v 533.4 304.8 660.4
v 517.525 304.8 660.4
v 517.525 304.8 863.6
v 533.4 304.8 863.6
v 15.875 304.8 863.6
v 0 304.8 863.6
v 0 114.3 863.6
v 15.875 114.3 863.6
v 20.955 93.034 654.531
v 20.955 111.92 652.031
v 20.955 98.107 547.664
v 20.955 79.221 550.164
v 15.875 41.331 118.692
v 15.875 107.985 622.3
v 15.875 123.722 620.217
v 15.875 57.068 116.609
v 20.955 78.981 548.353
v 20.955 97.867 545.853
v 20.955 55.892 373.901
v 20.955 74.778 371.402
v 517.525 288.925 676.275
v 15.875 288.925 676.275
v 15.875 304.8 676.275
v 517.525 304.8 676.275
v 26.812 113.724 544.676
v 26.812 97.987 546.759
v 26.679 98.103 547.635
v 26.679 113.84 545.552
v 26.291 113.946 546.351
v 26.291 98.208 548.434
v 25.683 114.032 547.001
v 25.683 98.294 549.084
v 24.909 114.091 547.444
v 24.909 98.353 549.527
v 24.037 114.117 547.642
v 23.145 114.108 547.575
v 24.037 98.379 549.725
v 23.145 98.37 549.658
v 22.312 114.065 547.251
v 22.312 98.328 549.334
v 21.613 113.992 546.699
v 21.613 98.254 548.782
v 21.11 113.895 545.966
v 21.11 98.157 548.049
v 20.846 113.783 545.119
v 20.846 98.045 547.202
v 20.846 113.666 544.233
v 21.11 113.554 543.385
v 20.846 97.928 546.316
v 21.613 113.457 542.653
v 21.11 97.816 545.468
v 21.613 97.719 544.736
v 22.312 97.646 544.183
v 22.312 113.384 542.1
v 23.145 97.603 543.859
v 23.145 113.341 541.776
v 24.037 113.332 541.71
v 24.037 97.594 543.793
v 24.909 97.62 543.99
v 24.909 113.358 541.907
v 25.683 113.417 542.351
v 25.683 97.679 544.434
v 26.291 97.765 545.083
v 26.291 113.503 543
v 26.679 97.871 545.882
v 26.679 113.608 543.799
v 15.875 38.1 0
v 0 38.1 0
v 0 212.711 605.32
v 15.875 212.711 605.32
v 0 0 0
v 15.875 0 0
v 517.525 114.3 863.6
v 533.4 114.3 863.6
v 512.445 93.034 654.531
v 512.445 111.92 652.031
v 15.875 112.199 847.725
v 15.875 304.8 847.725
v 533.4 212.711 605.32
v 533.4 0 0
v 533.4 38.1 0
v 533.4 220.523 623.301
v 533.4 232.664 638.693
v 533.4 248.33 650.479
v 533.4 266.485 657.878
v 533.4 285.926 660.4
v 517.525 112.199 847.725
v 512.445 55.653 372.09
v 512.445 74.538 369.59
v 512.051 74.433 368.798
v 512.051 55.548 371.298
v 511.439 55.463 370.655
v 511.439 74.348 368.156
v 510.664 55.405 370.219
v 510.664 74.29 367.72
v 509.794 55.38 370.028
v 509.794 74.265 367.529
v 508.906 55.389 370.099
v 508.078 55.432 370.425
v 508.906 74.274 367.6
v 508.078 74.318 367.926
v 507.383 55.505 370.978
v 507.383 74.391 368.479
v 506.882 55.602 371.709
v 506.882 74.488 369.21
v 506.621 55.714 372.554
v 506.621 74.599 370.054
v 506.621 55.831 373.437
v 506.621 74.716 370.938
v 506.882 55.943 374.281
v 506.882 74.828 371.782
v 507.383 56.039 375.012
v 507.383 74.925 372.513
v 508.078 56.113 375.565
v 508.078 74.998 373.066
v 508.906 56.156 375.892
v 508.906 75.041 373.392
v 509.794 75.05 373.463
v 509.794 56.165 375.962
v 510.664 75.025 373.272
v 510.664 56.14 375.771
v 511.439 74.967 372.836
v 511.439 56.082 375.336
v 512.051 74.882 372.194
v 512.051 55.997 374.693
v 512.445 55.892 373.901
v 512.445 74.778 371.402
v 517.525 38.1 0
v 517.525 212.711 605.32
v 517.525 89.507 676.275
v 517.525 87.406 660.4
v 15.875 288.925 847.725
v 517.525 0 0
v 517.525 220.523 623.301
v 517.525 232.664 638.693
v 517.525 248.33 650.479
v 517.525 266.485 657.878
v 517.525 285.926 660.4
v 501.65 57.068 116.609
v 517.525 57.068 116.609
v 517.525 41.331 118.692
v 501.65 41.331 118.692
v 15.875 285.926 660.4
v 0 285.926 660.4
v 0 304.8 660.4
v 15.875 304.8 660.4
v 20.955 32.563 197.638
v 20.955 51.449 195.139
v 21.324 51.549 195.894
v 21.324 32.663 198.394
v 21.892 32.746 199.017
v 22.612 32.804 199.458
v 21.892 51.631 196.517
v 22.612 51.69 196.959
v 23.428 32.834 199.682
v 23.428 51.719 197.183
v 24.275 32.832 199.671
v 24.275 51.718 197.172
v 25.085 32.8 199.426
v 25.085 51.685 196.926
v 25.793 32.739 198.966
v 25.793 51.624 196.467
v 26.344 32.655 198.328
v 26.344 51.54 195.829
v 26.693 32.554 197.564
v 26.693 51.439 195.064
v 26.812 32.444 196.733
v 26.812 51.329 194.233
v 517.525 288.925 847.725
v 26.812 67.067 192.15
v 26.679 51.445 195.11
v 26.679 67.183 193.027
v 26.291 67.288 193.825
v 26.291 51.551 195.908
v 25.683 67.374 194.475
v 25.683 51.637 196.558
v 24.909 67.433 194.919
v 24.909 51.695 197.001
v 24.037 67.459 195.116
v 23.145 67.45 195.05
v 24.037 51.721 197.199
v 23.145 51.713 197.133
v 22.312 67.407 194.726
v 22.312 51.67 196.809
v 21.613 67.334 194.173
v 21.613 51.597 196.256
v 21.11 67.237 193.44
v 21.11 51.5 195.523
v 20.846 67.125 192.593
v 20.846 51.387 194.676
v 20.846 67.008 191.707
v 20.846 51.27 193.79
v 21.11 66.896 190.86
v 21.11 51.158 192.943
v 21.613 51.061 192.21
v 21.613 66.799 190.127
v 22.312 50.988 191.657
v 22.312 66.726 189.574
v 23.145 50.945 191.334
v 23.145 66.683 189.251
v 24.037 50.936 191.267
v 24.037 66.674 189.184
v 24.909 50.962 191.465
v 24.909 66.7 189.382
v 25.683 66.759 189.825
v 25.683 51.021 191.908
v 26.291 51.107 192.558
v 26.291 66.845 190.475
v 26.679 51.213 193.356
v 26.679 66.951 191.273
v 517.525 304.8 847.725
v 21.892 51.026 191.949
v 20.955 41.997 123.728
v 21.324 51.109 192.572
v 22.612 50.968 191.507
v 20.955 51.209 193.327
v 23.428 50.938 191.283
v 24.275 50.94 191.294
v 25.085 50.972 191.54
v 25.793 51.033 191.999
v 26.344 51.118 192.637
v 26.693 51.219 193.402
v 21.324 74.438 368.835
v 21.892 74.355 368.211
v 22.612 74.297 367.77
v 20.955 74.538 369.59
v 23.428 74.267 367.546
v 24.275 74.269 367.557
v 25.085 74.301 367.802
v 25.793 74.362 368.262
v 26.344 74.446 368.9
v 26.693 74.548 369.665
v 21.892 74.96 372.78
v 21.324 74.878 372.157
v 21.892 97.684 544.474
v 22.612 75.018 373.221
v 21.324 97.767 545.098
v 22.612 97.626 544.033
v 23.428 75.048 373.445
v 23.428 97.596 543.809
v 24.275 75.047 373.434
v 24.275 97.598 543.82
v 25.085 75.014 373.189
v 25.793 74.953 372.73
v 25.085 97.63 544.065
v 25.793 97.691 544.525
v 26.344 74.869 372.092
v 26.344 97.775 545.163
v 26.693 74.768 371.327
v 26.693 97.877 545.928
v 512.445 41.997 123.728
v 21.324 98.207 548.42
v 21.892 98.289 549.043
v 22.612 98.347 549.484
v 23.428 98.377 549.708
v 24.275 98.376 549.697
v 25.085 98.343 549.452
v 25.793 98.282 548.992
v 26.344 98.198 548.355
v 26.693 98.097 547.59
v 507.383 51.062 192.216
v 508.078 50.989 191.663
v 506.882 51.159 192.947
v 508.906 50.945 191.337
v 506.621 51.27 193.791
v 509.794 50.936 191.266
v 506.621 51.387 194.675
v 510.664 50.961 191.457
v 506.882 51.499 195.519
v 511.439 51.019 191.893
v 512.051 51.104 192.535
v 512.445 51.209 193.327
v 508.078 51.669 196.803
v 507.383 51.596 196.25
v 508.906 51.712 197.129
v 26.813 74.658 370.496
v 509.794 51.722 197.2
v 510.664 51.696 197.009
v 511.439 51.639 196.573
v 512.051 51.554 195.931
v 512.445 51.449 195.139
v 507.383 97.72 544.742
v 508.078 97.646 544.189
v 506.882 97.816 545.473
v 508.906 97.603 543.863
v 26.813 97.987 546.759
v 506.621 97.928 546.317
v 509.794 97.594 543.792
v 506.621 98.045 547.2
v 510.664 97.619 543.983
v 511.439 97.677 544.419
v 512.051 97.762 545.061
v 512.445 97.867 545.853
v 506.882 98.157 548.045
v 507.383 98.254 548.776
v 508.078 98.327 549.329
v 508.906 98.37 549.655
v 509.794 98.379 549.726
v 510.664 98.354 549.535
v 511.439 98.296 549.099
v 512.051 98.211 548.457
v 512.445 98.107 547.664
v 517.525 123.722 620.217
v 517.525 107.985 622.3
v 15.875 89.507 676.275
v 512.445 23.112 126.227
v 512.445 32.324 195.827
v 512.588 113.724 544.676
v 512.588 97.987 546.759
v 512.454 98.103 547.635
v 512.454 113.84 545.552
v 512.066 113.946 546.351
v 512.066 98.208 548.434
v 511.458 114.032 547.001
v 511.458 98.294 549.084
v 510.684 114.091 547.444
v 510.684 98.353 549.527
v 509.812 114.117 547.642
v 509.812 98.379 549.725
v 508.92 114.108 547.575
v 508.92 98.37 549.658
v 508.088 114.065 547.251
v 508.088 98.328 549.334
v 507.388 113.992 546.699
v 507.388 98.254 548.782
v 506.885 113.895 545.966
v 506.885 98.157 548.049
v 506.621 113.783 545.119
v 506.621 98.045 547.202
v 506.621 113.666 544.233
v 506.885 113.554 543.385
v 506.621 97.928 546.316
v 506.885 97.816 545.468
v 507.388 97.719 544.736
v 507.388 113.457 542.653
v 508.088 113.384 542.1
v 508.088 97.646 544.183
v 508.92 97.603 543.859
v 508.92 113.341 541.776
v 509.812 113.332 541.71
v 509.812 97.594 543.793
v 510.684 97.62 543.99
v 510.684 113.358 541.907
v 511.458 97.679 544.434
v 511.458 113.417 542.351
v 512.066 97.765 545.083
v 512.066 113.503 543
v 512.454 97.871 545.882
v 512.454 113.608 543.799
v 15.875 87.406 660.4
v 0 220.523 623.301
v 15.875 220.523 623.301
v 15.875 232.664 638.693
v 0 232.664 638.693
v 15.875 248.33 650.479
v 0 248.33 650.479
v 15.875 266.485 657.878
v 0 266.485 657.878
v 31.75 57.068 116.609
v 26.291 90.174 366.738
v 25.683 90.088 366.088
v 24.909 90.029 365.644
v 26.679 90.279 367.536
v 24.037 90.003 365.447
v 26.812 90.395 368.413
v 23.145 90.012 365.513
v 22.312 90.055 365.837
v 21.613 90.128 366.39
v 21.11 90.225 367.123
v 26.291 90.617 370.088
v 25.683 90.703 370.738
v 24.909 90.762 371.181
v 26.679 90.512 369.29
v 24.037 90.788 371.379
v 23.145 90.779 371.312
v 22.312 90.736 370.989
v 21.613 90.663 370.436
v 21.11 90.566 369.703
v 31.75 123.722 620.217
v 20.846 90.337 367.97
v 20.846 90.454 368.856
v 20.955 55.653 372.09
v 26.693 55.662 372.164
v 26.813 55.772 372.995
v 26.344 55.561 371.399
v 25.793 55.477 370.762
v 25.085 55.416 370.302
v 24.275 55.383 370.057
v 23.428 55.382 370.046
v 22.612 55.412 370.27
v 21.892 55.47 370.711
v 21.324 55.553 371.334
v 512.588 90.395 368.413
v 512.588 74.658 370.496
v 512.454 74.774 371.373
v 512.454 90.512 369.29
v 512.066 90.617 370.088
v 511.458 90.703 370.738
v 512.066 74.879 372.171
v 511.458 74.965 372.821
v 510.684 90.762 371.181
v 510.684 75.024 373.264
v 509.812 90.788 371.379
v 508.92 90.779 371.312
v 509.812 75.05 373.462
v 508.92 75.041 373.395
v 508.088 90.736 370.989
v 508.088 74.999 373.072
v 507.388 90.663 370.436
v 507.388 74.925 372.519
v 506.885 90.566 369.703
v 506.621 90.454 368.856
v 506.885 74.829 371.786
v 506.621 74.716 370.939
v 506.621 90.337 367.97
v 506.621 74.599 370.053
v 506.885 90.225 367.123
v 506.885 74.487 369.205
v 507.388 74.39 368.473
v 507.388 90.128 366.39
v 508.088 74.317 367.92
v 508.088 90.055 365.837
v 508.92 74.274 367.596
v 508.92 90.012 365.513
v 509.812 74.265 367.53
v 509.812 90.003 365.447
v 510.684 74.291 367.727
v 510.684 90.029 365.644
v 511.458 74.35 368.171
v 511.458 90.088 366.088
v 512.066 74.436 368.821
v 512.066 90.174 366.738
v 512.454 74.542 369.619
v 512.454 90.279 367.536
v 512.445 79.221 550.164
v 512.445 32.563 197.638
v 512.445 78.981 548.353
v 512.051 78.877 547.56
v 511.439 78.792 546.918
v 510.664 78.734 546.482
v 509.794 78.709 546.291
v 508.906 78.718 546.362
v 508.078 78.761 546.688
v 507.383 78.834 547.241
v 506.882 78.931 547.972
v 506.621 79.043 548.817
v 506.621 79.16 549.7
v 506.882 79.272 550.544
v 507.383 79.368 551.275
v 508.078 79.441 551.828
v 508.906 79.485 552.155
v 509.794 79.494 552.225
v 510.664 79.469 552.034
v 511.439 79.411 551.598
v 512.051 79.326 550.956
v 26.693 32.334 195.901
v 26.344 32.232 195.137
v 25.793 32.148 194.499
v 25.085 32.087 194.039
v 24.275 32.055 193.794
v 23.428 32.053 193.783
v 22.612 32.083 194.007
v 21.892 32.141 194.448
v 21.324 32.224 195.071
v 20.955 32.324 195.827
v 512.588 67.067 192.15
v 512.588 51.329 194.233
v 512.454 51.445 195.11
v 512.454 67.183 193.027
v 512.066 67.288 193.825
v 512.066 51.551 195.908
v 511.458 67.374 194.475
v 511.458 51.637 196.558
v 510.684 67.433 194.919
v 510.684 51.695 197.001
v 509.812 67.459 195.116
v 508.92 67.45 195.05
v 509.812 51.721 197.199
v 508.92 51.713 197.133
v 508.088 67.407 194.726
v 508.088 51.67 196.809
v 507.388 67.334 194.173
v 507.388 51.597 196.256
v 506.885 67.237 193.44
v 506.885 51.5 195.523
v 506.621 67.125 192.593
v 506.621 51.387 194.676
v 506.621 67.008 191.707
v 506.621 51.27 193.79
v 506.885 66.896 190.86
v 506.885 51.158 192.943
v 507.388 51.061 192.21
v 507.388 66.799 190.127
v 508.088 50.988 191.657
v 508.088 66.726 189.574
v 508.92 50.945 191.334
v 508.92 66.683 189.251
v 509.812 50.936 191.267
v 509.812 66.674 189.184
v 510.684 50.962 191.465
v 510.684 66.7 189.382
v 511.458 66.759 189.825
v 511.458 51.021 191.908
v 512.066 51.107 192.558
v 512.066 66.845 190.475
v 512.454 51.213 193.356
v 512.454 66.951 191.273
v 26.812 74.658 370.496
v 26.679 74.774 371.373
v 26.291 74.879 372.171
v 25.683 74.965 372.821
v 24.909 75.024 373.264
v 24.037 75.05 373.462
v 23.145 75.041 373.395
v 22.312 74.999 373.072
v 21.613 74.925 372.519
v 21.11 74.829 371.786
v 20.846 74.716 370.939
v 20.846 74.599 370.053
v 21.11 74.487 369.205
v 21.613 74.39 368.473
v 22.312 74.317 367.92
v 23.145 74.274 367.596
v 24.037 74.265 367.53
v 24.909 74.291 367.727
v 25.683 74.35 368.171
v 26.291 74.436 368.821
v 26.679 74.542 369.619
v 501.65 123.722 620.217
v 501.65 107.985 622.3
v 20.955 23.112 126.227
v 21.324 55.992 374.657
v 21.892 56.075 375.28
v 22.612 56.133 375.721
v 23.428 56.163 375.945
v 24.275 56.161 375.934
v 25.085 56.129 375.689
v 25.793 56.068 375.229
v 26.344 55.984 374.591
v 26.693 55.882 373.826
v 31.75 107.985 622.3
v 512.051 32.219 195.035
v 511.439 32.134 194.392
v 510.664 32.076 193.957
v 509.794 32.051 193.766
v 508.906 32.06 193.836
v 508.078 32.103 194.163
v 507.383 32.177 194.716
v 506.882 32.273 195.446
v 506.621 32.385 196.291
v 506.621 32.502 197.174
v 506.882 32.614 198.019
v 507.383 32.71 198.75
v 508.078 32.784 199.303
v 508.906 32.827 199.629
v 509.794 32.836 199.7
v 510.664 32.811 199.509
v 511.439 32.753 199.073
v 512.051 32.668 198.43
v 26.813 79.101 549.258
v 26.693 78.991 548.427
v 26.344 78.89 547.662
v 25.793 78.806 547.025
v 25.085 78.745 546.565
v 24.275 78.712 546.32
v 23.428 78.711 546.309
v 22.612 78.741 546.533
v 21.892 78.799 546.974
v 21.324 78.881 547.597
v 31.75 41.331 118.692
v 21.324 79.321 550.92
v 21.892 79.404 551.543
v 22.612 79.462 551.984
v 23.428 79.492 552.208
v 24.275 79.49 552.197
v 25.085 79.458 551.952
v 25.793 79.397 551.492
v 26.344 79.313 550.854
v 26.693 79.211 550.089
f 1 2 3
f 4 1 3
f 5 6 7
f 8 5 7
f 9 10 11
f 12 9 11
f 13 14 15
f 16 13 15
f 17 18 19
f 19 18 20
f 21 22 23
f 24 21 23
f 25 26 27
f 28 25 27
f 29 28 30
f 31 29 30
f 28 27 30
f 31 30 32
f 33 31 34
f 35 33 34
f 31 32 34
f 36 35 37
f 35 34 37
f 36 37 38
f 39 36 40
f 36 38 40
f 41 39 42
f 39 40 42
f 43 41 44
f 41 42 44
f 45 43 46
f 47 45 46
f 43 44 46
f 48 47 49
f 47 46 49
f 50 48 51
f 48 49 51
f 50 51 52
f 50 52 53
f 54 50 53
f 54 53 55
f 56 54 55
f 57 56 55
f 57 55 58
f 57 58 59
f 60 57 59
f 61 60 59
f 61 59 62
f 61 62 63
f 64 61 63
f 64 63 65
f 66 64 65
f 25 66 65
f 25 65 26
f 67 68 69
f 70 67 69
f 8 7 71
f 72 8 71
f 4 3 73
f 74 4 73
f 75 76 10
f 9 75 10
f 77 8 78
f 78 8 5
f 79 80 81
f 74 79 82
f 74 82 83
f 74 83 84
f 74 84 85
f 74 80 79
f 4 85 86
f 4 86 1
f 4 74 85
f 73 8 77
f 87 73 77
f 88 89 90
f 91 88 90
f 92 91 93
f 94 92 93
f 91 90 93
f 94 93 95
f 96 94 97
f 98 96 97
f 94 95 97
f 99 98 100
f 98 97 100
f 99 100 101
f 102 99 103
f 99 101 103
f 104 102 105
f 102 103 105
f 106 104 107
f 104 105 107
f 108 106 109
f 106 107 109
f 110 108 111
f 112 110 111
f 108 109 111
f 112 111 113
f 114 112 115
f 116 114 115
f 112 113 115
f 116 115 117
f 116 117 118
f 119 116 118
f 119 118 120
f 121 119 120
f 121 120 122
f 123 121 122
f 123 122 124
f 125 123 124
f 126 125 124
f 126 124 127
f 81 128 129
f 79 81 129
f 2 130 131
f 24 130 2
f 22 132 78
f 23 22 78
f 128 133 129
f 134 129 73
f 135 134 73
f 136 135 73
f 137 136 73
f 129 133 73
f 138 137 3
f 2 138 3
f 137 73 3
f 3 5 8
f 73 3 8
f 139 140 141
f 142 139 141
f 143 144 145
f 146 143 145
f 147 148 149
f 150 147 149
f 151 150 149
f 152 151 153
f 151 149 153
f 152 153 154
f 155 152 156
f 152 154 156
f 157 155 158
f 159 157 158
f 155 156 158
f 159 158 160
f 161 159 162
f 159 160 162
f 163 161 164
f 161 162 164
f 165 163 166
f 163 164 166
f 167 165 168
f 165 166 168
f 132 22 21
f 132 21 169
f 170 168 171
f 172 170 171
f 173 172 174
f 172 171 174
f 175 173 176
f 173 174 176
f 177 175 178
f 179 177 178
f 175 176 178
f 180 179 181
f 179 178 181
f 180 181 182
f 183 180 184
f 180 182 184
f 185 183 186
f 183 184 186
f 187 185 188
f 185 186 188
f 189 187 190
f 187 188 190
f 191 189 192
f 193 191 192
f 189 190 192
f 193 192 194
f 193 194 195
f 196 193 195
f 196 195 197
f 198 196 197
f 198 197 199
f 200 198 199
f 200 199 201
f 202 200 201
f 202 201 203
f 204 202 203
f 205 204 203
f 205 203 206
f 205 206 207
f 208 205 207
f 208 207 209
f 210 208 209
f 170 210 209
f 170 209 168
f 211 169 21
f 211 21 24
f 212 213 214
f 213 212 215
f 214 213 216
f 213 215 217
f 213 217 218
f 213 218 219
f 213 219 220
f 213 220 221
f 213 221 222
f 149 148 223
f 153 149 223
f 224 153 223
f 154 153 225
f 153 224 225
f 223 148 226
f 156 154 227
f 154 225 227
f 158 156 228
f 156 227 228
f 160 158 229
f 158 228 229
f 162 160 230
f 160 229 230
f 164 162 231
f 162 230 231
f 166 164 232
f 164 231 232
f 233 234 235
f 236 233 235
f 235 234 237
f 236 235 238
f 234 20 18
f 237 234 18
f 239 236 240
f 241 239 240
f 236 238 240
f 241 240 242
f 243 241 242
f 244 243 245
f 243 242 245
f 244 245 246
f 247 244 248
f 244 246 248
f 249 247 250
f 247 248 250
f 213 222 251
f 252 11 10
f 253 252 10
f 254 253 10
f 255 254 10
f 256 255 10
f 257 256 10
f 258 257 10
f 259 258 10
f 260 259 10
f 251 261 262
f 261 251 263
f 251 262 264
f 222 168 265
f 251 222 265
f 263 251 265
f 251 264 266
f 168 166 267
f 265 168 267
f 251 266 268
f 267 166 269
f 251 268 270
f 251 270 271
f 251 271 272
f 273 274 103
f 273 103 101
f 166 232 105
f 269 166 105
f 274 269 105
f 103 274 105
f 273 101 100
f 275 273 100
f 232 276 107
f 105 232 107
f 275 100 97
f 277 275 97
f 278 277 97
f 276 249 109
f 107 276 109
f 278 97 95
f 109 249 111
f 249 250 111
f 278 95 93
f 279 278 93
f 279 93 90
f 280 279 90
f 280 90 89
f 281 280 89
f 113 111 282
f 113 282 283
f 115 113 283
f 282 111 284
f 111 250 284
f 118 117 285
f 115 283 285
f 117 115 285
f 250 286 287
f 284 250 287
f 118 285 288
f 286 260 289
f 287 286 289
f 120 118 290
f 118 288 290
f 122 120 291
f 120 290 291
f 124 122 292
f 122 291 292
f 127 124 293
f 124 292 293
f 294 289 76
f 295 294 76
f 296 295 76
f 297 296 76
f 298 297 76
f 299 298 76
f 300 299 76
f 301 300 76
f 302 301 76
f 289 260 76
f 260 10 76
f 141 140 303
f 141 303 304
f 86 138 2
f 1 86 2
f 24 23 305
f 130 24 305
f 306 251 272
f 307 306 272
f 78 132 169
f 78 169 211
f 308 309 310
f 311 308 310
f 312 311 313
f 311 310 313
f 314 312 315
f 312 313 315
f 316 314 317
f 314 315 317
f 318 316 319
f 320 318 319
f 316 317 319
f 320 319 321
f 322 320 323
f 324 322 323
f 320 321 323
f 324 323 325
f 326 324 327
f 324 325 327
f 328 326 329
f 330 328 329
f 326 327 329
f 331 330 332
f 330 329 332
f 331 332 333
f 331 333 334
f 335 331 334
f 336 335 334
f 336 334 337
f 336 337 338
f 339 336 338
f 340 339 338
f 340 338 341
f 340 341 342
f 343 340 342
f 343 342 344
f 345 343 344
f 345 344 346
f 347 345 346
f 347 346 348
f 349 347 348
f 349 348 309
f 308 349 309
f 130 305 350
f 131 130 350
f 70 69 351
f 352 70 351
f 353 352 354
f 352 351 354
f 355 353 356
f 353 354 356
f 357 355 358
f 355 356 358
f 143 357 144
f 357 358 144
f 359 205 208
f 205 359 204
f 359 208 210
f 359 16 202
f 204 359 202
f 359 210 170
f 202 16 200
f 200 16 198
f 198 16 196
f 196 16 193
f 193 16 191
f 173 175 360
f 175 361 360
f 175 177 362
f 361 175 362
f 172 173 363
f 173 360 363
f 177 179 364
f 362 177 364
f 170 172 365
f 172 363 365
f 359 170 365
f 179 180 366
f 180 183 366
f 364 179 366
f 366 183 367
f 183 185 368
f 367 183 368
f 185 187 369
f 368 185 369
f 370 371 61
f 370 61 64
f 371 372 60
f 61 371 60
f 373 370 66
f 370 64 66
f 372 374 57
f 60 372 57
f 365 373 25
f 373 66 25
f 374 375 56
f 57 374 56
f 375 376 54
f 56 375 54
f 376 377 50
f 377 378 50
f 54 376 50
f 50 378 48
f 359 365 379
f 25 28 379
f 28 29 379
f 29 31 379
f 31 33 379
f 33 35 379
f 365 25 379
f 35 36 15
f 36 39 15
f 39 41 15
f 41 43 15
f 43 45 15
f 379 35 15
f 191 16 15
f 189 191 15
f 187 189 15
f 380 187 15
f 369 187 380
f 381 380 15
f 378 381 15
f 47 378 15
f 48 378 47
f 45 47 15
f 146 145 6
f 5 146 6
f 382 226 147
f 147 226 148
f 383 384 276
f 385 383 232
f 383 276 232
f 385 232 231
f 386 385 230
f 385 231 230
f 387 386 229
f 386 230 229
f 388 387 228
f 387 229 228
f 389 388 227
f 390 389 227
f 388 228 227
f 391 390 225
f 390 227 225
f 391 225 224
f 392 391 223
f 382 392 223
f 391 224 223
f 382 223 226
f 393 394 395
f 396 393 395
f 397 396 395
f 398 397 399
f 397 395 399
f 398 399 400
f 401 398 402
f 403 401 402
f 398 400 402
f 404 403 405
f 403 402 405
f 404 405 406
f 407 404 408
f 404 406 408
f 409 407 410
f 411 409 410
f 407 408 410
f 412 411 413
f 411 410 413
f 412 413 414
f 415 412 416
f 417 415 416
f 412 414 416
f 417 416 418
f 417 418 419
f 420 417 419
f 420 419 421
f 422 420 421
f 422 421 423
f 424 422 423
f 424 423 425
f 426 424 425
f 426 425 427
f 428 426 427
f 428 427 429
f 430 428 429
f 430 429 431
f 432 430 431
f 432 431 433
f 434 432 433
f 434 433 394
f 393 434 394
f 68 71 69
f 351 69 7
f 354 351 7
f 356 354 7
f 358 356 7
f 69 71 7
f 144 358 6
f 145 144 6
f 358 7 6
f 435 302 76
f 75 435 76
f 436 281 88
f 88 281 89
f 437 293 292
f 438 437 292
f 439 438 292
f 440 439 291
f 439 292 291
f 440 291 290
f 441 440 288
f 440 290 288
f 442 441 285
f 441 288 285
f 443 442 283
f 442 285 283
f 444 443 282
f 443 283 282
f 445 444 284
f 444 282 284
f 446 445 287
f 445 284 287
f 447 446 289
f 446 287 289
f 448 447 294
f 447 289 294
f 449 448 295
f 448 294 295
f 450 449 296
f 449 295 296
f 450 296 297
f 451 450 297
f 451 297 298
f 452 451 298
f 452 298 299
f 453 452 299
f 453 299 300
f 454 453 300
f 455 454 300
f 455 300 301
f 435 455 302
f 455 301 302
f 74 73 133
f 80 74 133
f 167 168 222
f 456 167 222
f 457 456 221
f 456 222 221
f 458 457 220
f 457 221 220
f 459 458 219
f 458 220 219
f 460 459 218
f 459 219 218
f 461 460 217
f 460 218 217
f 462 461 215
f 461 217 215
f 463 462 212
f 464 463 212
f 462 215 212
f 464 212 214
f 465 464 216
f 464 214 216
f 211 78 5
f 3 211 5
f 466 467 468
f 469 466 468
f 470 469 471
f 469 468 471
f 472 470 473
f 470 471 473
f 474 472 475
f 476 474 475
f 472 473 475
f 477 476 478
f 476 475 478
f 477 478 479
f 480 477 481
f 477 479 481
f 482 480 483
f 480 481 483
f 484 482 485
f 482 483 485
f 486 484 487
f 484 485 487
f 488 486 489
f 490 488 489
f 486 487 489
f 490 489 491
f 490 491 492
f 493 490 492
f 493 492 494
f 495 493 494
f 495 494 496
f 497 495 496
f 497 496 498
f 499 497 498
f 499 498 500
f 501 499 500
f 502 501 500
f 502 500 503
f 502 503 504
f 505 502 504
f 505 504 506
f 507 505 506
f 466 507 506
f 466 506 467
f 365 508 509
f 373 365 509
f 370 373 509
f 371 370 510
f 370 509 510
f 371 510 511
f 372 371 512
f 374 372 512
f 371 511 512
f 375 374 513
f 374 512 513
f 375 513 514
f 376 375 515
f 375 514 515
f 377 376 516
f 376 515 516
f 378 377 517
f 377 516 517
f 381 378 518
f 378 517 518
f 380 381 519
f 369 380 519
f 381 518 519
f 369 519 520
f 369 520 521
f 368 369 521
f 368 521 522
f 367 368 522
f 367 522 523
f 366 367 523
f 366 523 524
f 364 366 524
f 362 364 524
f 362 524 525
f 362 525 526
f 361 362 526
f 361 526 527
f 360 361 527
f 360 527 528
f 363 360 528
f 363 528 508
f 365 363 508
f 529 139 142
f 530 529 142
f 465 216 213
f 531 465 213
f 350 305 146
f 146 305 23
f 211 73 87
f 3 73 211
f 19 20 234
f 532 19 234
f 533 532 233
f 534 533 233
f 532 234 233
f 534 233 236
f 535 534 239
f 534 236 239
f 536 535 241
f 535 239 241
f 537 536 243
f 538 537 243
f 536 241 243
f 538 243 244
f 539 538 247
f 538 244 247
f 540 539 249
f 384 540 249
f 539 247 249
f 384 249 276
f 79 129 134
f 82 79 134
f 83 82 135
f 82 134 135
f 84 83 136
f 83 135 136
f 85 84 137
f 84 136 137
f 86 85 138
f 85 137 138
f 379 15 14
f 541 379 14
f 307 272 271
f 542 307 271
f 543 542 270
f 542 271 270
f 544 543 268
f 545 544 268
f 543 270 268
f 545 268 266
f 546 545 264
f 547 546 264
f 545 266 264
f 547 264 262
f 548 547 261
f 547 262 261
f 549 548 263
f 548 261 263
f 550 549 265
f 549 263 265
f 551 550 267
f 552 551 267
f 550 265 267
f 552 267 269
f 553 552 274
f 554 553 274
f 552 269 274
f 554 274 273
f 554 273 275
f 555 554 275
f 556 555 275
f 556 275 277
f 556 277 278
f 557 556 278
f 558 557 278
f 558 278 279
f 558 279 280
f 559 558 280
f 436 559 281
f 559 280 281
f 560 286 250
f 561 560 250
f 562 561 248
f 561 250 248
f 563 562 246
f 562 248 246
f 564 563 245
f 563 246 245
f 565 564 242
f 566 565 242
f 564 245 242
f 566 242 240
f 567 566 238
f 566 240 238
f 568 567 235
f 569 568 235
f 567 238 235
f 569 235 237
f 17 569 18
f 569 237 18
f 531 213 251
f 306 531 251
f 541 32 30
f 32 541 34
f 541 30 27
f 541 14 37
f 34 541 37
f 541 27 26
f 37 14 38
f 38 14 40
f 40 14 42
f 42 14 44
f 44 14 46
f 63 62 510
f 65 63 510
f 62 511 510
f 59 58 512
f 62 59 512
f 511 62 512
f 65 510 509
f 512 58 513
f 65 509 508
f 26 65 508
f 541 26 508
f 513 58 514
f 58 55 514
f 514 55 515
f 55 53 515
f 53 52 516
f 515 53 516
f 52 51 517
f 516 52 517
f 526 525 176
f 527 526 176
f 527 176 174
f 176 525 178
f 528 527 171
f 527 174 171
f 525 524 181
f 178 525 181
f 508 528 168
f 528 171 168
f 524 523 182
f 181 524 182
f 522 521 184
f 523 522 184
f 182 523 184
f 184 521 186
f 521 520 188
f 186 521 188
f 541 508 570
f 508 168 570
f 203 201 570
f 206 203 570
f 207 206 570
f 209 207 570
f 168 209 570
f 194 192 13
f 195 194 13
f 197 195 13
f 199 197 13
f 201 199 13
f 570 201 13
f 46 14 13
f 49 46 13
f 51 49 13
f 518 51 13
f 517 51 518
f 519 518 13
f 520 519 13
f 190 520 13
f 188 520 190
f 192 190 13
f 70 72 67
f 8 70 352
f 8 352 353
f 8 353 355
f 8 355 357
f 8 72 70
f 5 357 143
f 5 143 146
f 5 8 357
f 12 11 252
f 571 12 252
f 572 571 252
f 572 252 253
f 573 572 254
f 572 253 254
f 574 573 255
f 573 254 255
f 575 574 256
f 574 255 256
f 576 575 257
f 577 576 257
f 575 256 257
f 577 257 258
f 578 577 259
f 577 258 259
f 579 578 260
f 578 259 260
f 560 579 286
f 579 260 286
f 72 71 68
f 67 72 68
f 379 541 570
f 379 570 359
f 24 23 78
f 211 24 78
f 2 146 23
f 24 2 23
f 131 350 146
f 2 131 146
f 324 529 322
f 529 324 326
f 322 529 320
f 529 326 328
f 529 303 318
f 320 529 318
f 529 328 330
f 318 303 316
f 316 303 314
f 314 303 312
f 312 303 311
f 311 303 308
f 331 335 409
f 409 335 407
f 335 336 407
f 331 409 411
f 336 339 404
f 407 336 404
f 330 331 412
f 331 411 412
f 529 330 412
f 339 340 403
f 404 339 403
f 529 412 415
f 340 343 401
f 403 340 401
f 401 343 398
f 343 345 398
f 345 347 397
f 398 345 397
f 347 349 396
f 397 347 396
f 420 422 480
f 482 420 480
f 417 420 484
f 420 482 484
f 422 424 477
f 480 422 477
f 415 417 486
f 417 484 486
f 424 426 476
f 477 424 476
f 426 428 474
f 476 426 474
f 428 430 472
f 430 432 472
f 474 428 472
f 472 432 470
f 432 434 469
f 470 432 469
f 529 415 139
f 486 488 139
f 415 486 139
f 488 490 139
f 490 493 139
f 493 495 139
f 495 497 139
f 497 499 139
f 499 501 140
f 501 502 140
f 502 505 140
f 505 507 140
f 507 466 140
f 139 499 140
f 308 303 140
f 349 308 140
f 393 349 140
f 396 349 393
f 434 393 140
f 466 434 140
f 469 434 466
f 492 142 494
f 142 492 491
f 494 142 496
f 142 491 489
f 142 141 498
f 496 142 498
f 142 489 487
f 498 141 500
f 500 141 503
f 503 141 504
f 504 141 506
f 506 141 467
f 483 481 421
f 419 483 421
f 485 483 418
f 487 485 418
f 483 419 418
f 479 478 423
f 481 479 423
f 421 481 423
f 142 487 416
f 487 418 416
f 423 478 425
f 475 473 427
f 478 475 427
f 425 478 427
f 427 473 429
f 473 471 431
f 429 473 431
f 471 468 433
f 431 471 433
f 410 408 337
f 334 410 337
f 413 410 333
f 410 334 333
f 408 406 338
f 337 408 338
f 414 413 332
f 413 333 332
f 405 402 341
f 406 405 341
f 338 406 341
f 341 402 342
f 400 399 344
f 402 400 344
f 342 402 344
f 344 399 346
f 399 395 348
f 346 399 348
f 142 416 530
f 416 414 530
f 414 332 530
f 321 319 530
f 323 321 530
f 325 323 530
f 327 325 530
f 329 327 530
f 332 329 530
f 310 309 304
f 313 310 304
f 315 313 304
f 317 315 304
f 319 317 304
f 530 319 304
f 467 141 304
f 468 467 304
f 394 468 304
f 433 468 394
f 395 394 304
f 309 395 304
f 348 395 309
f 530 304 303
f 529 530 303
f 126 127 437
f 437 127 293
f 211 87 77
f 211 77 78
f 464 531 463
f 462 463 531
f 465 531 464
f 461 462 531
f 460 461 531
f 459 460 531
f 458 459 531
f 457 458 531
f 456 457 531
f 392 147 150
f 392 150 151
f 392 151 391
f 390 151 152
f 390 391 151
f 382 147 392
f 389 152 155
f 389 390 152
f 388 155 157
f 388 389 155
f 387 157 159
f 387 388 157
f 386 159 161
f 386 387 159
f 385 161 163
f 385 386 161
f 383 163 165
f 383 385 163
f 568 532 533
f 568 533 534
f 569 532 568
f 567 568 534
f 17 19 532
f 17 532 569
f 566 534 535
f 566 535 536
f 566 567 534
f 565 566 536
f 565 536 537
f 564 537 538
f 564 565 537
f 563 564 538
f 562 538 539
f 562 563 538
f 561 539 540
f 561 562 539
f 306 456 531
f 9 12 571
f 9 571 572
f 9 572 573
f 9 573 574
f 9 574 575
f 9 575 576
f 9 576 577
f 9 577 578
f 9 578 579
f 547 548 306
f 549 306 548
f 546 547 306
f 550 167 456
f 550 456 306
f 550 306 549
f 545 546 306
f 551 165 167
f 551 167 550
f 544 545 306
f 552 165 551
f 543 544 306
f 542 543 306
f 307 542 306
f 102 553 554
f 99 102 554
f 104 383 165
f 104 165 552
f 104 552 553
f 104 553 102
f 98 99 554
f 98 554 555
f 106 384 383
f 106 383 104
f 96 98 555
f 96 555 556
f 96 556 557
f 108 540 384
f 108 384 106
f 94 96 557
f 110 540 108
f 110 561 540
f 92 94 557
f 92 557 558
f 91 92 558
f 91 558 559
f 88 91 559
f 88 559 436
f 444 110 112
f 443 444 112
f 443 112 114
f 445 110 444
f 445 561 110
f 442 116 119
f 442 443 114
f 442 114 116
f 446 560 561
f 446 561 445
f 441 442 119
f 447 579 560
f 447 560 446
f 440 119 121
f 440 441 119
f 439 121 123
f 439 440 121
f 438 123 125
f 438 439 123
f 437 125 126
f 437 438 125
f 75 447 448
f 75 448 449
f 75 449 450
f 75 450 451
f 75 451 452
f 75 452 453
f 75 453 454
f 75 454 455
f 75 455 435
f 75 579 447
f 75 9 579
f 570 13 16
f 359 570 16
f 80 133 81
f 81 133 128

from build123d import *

# Parameters (mm, degrees)
F1_DEPTH  = 15.875
F3_DEPTH  = 501.65
F5_DEPTH  = 501.65
F6_W      = 15.875
F6_H      = 171.45
F7_DEPTH  = 501.65
F9_DEPTH  = 15.875
F11_DEPTH = 15.875
F13_DEPTH = 15.875
F14_R     = 3
F15_DEPTH = 25.4
F17_DEPTH = 19.05


with BuildPart() as f1:
    # F0 (on Right) → F1 (new body)
    with BuildSketch(Plane.YZ):
        with BuildLine():
            Line((114.3, 863.6), (0, 0))
            Line((0, 0), (38.1, 0))
            Line((38.1, 0), (212.7114350854, 605.3196416292))
            ThreePointArc((212.7114350854, 605.3196416292), (240.1161321142, 645.0923504726), (285.9261927333, 660.4))
            Line((285.9261927333, 660.4), (304.8, 660.4))
            Line((304.8, 660.4), (304.8, 863.6))
            Line((304.8, 863.6), (114.3, 863.6))
        make_face()
    extrude(amount=F1_DEPTH)


with BuildPart() as f3:
    # F2 (on face) → F3 (new body)
    with BuildSketch(Plane.YZ.offset(15.875)):
        Polygon((304.8, 863.6), (114.3, 863.6), (112.1988970588, 847.725), (304.8, 847.725), align=None)
    extrude(amount=F3_DEPTH)


with BuildPart() as f5:
    # F4 (on face) → F5 (new body)
    with BuildSketch(Plane.YZ.offset(15.875)):
        Polygon((87.4058823529, 660.4), (304.8, 660.4), (304.8, 676.275), (89.5069852941, 676.275), align=None)
    extrude(amount=F5_DEPTH)


with BuildPart() as f7:
    # F6 (on face) → F7 (new body)
    with BuildSketch(Plane.YZ.offset(15.875)):
        with Locations((296.8625, 762)):
            Rectangle(F6_W, F6_H)
    extrude(amount=F7_DEPTH)


with BuildPart() as f9:
    # F8 (on face) → F9 (new body)
    with BuildSketch(Plane.YZ.offset(517.525)):
        with BuildLine():
            Line((114.3, 863.6), (0, 0))
            Line((0, 0), (38.1, 0))
            Line((38.1, 0), (212.7114350854, 605.3196416292))
            ThreePointArc((212.7114350854, 605.3196416292), (240.1161321142, 645.0923504726), (285.9261927333, 660.4))
            Line((285.9261927333, 660.4), (304.8, 660.4))
            Line((304.8, 660.4), (304.8, 676.275))
            Line((304.8, 676.275), (304.8, 847.725))
            Line((304.8, 847.725), (304.8, 863.6))
            Line((304.8, 863.6), (114.3, 863.6))
        make_face()
    extrude(amount=F9_DEPTH)


with BuildPart() as f11:
    # F10 (on face) → F11 (new body)
    with BuildSketch(Plane.YZ.offset(15.875)):
        Polygon((123.7224961011, 620.2170615854), (107.984739191, 622.3), (41.3307099247, 118.6917788771), (57.0684668348, 116.6088404625), align=None)
    extrude(amount=F11_DEPTH)


with BuildPart() as f13:
    # F12 (on face) → F13 (new body)
    with BuildSketch(Plane(origin=(517.525, 0, 0), x_dir=(0, -1, 0), z_dir=(-1, 0, 0))):
        Polygon((-41.3307099247, 118.6917788771), (-107.984739191, 622.3), (-123.7224961011, 620.2170615854), (-57.0684668348, 116.6088404625), align=None)
    extrude(amount=F13_DEPTH)


with BuildPart() as f15_tool:
    # F14 (on face) → F15 (new body)
    with BuildSketch(Plane(origin=(0, 25.1804110561, -3.3327014633), x_dir=(1, 0, 0), z_dir=(0, -0.991354766, 0.131208719))):
        with Locations((23.8125, 554.8886101794)):
            Circle(F14_R)
        with Locations((23.8125, 377.0886101794)):
            Circle(F14_R)
        with Locations((23.8125, 199.2886101794)):
            Circle(F14_R)
        with Locations((509.5875, 554.8886101794)):
            Circle(F14_R)
        with Locations((509.5875, 377.0886101794)):
            Circle(F14_R)
        with Locations((509.5875, 199.2886101794)):
            Circle(F14_R)
    extrude(amount=-F15_DEPTH)


with BuildPart() as f11_1:
    add(f11.part)

    # F15: cut by f15_tool
    add(f15_tool.part, mode=Mode.SUBTRACT)


with BuildPart() as f13_1:
    add(f13.part)

    # F15: cut by f15_tool
    add(f15_tool.part, mode=Mode.SUBTRACT)


with BuildPart() as f17:
    # F16 (on face) → F17 (new body)
    with BuildSketch(Plane(origin=(0, 25.1804110561, -3.3327014633), x_dir=(1, 0, 0), z_dir=(0, -0.991354766, 0.131208719))):
        with BuildLine():
            Line((20.955, 661.0791013188), (20.955, 631.0886101794))
            Line((20.955, 631.0886101794), (31.75, 631.0886101794))
            Line((31.75, 631.0886101794), (31.75, 128.1686101794))
            Line((31.75, 128.1686101794), (512.445, 128.1686101794))
            Line((512.445, 128.1686101794), (512.445, 198.3749944232))
            ThreePointArc((512.445, 198.3749944232), (506.5875, 199.2886101794), (512.445, 200.2022259356))
            Line((512.445, 200.2022259356), (512.445, 376.1749944232))
            ThreePointArc((512.445, 376.1749944232), (506.5875, 377.0886101794), (512.445, 378.0022259356))
            Line((512.445, 378.0022259356), (512.445, 553.9749944232))
            ThreePointArc((512.445, 553.9749944232), (506.5875, 554.8886101794), (512.445, 555.8022259356))
            Line((512.445, 555.8022259356), (512.445, 661.0791013188))
            Line((512.445, 661.0791013188), (20.955, 661.0791013188))
        make_face()
        with BuildLine():
            Line((31.75, 631.0886101794), (20.955, 631.0886101794))
            Line((20.955, 631.0886101794), (20.955, 555.8022259356))
            ThreePointArc((20.955, 555.8022259356), (24.2748310502, 557.8527711062), (26.8125, 554.8886101794))
            ThreePointArc((26.8125, 554.8886101794), (24.2748310502, 551.9244492526), (20.955, 553.9749944232))
            Line((20.955, 553.9749944232), (20.955, 378.0022259356))
            ThreePointArc((20.955, 378.0022259356), (24.2748310502, 380.0527711062), (26.8125, 377.0886101794))
            ThreePointArc((26.8125, 377.0886101794), (24.2748310502, 374.1244492526), (20.955, 376.1749944232))
            Line((20.955, 376.1749944232), (20.955, 200.2022259356))
            ThreePointArc((20.955, 200.2022259356), (24.2748310502, 202.2527711062), (26.8125, 199.2886101794))
            ThreePointArc((26.8125, 199.2886101794), (24.2748310502, 196.3244492526), (20.955, 198.3749944232))
            Line((20.955, 198.3749944232), (20.955, 128.1686101794))
            Line((20.955, 128.1686101794), (31.75, 128.1686101794))
            Line((31.75, 128.1686101794), (31.75, 631.0886101794))
        make_face()
    extrude(amount=F17_DEPTH)


solid = Compound([f1.part, f3.part, f5.part, f7.part, f9.part, f11_1.part, f13_1.part, f17.part])
